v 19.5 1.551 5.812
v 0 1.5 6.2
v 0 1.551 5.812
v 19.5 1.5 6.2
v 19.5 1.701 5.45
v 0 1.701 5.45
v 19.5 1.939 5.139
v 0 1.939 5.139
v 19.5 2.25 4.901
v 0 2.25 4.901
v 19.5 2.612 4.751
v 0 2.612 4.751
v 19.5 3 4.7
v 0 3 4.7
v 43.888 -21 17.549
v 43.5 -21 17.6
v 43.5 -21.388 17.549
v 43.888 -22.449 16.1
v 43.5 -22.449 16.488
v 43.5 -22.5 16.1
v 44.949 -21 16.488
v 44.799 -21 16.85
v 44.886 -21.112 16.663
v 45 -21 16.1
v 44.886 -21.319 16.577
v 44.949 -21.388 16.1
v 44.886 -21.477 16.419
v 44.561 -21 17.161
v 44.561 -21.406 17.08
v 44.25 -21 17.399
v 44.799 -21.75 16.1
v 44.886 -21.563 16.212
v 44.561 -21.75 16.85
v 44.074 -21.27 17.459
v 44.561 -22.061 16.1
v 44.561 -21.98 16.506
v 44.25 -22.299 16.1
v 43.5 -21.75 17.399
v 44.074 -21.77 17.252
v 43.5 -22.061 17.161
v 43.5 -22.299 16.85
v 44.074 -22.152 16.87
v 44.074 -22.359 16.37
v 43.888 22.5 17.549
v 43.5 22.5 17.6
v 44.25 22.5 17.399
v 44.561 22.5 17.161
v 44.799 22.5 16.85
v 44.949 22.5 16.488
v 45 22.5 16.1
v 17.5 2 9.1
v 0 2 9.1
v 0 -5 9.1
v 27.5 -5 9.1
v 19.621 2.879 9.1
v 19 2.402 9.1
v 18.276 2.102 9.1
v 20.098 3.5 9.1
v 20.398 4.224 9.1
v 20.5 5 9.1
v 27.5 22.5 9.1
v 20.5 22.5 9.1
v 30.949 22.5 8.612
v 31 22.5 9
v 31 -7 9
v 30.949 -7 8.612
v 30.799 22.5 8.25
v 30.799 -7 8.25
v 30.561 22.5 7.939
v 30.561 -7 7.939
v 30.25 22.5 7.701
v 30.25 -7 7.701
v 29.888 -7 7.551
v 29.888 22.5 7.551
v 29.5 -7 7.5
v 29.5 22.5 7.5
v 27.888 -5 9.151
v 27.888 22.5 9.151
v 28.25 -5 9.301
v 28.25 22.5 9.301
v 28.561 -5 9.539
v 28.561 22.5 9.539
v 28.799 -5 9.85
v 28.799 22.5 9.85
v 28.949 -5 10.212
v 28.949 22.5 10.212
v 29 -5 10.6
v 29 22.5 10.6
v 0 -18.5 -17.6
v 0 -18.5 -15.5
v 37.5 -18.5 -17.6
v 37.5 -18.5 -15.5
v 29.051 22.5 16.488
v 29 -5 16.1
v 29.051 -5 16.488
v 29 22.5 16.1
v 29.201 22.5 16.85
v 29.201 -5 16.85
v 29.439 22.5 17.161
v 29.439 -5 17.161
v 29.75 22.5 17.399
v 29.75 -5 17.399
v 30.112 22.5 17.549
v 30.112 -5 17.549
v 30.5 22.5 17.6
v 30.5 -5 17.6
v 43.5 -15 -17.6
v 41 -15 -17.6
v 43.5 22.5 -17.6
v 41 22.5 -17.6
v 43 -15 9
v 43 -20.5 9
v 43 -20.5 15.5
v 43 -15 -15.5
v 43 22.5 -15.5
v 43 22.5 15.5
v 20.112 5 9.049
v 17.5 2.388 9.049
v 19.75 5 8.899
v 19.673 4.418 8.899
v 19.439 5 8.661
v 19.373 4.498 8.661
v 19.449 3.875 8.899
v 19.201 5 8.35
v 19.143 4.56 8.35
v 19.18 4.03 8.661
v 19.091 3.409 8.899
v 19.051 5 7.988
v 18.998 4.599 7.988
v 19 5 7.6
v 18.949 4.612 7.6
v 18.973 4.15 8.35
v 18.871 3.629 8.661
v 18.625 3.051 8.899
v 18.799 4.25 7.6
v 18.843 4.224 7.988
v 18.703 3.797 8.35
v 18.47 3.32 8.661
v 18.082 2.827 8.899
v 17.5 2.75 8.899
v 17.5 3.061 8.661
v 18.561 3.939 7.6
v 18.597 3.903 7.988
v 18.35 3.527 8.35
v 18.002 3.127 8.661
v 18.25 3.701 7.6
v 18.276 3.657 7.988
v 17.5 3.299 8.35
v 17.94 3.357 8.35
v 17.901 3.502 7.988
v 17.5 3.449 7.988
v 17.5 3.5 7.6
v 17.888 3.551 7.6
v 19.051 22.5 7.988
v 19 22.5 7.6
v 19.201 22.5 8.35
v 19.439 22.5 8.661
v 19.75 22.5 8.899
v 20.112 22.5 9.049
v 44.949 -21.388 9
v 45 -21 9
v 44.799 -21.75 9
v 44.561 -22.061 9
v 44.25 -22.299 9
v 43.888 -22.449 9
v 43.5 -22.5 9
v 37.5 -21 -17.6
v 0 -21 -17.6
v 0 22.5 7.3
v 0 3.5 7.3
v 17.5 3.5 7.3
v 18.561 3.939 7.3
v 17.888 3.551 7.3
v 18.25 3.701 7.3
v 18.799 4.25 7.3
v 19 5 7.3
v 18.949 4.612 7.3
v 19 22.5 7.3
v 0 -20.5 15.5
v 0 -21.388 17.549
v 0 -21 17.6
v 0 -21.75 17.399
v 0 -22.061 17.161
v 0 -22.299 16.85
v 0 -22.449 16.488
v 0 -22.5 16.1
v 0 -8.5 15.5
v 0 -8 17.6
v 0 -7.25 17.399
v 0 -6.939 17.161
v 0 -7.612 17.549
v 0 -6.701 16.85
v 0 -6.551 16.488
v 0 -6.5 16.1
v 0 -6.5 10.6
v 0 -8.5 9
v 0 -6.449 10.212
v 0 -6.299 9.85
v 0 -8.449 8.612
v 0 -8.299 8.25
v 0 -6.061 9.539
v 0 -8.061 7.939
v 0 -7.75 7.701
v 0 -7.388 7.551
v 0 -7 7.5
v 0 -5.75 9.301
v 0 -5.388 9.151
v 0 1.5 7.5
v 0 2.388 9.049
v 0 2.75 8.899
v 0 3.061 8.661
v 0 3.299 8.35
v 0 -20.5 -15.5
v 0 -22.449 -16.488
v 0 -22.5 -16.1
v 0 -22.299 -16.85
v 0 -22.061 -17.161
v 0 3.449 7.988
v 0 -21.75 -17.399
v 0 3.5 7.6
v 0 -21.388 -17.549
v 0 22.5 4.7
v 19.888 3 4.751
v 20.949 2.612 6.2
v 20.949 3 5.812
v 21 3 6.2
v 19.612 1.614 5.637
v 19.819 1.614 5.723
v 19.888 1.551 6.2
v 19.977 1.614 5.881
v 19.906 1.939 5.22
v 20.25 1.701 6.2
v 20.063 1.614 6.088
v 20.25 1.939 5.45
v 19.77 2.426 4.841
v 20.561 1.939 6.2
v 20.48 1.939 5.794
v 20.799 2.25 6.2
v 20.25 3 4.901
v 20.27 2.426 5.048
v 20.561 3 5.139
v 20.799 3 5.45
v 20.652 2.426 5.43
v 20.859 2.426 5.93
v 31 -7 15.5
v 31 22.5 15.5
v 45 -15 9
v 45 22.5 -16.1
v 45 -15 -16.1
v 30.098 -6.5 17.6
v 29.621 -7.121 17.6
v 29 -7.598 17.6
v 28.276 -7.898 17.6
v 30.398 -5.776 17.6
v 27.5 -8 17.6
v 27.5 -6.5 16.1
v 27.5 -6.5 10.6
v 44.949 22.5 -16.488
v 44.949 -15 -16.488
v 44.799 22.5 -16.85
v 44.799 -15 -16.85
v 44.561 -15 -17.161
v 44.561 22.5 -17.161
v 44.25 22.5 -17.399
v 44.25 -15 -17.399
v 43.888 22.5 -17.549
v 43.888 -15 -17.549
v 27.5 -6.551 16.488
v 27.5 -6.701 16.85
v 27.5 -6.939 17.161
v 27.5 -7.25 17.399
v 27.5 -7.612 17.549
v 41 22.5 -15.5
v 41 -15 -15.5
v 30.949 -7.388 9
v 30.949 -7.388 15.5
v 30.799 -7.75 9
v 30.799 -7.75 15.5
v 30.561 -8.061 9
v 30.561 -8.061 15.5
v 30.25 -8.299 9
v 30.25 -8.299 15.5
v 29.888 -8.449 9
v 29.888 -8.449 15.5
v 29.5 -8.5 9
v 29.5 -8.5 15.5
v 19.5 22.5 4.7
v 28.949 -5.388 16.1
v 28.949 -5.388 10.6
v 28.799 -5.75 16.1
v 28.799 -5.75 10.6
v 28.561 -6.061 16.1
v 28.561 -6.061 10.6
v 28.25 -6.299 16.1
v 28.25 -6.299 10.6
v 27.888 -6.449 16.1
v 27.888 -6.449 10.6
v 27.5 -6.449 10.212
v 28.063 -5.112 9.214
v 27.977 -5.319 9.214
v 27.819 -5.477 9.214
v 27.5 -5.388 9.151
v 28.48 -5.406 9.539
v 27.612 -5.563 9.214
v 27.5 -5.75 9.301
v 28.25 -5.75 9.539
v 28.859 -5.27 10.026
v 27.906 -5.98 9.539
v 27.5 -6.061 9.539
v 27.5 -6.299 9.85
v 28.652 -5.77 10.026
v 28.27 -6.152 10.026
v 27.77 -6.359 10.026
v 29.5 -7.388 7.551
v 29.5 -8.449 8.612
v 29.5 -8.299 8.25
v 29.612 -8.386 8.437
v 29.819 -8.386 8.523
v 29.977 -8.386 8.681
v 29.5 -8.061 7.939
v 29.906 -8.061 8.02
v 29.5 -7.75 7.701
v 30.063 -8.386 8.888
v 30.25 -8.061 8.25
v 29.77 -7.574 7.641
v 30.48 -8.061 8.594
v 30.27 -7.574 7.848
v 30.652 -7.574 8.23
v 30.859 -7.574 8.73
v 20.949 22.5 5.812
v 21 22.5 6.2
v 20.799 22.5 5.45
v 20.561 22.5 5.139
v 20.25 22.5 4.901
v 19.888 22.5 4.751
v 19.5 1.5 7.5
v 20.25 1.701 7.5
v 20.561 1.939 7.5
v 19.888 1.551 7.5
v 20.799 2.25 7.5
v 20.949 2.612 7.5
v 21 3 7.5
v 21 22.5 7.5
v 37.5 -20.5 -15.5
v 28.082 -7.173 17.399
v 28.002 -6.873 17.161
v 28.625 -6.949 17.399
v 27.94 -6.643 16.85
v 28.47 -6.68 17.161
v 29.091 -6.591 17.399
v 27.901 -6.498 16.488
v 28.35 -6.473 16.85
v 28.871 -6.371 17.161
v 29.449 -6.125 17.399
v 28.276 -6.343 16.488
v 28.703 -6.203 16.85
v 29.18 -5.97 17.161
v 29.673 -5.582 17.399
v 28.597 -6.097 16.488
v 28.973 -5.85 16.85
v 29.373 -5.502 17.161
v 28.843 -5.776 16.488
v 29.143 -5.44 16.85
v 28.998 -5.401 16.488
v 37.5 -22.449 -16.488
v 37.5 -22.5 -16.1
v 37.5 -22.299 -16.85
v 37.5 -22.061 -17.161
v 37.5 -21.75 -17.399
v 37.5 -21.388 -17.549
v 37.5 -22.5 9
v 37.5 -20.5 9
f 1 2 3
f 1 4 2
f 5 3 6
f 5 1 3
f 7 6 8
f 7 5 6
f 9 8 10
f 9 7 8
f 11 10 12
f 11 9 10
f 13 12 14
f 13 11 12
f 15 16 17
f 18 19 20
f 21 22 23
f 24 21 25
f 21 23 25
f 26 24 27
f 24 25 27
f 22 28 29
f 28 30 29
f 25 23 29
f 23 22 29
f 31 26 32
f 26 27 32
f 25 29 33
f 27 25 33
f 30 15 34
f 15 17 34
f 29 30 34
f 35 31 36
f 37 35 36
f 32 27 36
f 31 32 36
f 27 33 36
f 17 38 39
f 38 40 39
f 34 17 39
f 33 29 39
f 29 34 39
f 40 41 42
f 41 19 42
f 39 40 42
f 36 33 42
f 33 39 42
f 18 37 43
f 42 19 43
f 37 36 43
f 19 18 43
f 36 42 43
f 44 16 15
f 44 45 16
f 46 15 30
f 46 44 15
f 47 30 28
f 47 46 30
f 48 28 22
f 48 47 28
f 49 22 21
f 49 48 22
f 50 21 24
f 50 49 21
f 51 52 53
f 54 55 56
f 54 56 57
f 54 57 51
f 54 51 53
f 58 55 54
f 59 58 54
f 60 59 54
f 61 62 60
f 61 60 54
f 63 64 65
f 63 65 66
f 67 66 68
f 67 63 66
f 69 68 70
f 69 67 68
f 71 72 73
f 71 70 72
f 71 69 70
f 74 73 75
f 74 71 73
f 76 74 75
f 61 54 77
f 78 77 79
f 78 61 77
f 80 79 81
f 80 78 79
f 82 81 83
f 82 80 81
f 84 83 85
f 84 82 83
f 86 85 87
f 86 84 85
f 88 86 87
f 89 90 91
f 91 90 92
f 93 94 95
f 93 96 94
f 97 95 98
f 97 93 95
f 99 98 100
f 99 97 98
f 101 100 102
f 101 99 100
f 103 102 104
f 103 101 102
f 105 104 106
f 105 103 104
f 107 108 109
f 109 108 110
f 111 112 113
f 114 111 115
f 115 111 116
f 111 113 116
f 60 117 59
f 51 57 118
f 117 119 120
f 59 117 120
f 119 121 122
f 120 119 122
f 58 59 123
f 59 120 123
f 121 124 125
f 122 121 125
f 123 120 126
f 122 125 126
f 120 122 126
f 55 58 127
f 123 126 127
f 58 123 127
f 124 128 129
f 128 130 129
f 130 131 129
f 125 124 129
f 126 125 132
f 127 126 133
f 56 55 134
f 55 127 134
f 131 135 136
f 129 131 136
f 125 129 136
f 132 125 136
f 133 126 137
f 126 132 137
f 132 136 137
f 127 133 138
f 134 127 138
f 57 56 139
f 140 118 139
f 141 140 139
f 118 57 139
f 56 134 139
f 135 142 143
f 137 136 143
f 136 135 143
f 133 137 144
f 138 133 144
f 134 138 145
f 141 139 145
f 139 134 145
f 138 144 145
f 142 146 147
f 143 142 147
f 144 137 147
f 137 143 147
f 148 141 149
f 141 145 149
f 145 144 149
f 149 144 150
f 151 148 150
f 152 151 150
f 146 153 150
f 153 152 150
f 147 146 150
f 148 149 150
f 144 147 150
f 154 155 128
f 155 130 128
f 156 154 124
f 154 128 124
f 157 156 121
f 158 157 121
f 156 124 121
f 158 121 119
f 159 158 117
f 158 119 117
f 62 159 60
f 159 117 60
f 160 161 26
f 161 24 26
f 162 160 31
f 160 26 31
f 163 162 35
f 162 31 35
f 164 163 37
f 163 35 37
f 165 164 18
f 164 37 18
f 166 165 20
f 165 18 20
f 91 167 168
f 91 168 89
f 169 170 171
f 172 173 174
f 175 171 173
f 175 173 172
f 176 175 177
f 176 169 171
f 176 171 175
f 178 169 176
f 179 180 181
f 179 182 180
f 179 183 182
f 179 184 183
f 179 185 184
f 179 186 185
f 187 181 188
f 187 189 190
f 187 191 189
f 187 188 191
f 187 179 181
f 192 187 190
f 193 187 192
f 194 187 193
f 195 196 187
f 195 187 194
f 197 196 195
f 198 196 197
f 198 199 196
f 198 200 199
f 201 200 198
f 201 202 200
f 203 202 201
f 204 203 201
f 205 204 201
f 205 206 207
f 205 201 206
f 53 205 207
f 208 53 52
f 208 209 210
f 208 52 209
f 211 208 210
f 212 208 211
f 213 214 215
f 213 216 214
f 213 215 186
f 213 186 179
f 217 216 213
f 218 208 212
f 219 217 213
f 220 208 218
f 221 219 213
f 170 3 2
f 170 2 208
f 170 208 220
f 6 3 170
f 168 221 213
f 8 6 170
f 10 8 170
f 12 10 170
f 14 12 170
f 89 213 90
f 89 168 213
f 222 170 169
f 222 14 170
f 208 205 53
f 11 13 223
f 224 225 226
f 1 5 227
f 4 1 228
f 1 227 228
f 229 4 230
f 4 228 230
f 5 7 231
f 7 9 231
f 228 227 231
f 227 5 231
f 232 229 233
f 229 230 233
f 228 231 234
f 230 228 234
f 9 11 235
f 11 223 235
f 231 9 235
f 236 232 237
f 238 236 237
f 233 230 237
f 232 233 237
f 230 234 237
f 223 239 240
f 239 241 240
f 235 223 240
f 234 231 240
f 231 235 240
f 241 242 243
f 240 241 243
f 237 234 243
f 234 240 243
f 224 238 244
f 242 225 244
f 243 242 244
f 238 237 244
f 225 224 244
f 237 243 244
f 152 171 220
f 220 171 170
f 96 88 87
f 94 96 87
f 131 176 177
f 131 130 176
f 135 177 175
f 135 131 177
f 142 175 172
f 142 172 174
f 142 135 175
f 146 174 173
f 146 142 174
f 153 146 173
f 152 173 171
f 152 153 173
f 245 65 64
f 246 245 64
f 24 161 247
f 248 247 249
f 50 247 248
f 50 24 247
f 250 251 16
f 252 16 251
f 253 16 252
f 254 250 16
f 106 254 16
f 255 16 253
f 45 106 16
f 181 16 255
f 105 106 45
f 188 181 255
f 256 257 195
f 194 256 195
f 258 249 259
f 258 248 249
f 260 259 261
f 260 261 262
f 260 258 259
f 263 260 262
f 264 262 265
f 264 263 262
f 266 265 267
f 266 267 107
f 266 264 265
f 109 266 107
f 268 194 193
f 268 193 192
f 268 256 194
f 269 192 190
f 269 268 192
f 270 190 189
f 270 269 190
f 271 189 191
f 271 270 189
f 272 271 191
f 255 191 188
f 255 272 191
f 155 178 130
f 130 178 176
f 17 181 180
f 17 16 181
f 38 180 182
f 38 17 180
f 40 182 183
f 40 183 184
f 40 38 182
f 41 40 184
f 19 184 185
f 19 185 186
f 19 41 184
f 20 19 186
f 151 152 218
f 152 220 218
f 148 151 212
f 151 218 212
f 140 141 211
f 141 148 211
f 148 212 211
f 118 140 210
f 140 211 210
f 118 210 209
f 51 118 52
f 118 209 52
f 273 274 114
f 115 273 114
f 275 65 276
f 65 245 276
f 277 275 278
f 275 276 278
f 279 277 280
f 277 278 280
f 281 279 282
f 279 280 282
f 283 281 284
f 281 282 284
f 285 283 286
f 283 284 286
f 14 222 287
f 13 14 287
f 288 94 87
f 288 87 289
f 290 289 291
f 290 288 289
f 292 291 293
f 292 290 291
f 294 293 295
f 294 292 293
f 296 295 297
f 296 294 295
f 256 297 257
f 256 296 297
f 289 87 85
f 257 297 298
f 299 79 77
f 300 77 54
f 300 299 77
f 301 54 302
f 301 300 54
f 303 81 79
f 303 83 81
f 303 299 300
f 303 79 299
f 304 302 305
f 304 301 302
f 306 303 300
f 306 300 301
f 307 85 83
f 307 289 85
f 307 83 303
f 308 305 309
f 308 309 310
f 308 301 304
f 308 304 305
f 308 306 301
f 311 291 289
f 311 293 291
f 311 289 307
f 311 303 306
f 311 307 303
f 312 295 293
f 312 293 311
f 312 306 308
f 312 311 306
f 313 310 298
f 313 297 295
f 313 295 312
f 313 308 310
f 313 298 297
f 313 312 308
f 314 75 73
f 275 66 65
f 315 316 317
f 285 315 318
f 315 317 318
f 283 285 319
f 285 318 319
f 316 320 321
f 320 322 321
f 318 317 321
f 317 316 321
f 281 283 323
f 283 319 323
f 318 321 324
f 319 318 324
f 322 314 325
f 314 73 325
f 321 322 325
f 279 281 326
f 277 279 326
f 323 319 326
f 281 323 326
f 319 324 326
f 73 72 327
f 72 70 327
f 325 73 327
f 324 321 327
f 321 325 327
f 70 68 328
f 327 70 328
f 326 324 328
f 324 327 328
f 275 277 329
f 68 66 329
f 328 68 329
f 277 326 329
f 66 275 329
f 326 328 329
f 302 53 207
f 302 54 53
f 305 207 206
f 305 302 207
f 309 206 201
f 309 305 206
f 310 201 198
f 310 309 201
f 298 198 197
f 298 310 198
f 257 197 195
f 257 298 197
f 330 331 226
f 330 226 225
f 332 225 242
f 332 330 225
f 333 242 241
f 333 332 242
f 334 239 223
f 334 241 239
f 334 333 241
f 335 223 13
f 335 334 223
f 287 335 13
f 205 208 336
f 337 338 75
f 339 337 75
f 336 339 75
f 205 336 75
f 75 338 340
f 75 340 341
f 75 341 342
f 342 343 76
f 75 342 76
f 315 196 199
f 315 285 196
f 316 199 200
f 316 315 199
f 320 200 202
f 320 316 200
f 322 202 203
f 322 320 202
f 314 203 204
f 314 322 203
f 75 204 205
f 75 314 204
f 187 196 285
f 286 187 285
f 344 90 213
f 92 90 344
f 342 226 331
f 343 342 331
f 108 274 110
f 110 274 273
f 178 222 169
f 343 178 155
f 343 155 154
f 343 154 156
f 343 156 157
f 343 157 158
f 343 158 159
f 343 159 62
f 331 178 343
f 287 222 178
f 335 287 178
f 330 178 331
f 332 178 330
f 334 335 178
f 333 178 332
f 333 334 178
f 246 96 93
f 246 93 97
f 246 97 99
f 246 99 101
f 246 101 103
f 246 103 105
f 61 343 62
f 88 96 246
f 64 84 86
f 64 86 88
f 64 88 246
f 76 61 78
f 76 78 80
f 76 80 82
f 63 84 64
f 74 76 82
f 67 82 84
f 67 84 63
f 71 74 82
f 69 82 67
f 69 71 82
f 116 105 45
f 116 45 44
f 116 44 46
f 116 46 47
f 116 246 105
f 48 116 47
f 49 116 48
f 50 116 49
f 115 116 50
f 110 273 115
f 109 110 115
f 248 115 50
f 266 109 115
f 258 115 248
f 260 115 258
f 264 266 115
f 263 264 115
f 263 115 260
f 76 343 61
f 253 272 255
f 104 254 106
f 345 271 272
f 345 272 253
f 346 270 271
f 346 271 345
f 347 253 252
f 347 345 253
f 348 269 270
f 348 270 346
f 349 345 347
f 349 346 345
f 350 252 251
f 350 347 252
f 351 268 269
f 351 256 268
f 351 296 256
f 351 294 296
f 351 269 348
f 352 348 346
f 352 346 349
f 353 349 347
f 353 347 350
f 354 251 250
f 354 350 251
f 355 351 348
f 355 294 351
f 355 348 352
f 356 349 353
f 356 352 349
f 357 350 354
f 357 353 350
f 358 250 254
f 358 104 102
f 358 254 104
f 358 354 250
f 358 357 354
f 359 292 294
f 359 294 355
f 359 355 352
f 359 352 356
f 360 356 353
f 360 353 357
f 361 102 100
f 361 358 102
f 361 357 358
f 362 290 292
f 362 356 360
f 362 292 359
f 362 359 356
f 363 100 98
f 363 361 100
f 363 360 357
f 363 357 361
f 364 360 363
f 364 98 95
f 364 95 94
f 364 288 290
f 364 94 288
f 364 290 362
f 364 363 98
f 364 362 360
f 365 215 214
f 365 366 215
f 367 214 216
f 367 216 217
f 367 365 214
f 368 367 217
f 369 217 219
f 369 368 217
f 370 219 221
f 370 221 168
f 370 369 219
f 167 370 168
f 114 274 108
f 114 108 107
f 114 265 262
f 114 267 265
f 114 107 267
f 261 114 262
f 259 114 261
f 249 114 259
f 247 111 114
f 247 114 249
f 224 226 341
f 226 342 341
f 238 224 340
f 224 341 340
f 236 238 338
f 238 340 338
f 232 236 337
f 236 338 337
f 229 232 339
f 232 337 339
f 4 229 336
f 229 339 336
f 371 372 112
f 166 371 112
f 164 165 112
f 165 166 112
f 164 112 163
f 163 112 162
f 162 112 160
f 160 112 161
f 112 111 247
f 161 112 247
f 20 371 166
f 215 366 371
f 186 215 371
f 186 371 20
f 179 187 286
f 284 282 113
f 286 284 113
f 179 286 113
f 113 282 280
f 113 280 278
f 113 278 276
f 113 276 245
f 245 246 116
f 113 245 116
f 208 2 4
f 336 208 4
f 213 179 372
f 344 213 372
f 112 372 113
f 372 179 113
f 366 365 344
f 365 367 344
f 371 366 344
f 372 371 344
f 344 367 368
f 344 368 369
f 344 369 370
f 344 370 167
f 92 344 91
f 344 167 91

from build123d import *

# Parameters (mm, degrees)
F0_W          = 45
F0_H          = 35.2
F1_DEPTH      = 45
F2_W          = 29
F2_H          = 29
F3_DEPTH      = 22.5
F4_W          = 47
F4_H          = 47
F5_DEPTH      = 15.5
F6_W          = 47
F6_H          = 47
F7_DEPTH      = 28
F8_W          = 15
F8_H          = 15
F9_DEPTH      = 24.7
F9_DEPTH_BACK = 9
F11_START     = 7.5
F11_DEPTH     = 8
F13_START     = 7.5
F13_DEPTH     = 1.6
F15_START     = 4.7
F15_DEPTH     = 2.8
F17_START     = 4.7
F16_W         = 19
F16_H         = 19
F17_DEPTH     = 2.6
F18_R         = 1.5


with BuildPart() as f1:
    # F0 (on Right) → F1 (new body)
    with BuildSketch(Plane.YZ):
        Rectangle(F0_W, F0_H)
    extrude(amount=F1_DEPTH)

    # F2 (on Top) → F3 (cut, symmetric)
    with BuildSketch(Plane.XY):
        with Locations((14.5, 8)):
            Rectangle(F2_W, F2_H)
    extrude(amount=F3_DEPTH, both=True, mode=Mode.SUBTRACT)

    # F4 (on Top) → F5 (cut, symmetric)
    with BuildSketch(Plane.XY):
        with Locations((19.5, 3)):
            Rectangle(F4_W, F4_H)
    extrude(amount=F5_DEPTH, both=True, mode=Mode.SUBTRACT)

    # F6 (on Top) → F7 (cut)
    with BuildSketch(Plane.XY):
        with Locations((17.5, 5)):
            Rectangle(F6_W, F6_H)
    extrude(amount=-F7_DEPTH, mode=Mode.SUBTRACT)

    # F8 (on Top) → F9 (cut, two sides)
    with BuildSketch(Plane.XY) as f9_sk:
        with Locations((45, -22.5)):
            Rectangle(F8_W, F8_H)
    extrude(amount=-F9_DEPTH, mode=Mode.SUBTRACT)
    extrude(f9_sk.sketch, amount=F9_DEPTH_BACK, mode=Mode.SUBTRACT)

    # F10 (on Top) → F11 (join)
    with BuildSketch(Plane.XY.offset(F11_START)):
        Polygon((31, 22.5), (29, 22.5), (29, -6.5), (0, -6.5), (0, -8.5), (31, -8.5), align=None)
    extrude(amount=F11_DEPTH)

    # F12 (on Top) → F13 (join)
    with BuildSketch(Plane.XY.offset(F13_START)):
        Polygon((29, -6.5), (29, 22.5), (19, 22.5), (19, 3.5), (0, 3.5), (0, -6.5), align=None)
    extrude(amount=F13_DEPTH)

    # F14 (on Top) → F15 (join)
    with BuildSketch(Plane.XY.offset(F15_START)):
        Polygon((21, 22.5), (19, 22.5), (19, 3.5), (0, 3.5), (0, 1.5), (21, 1.5), align=None)
    extrude(amount=F15_DEPTH)

    # F16 (on Top) → F17 (join)
    with BuildSketch(Plane.XY.offset(F17_START)):
        with Locations((9.5, 13)):
            Rectangle(F16_W, F16_H)
    extrude(amount=F17_DEPTH)

    # F18
    f18_edges = [f1.edges().sort_by_distance(p)[0] for p in [
        (22.5, -22.5, 17.6),
        (45, 0, 17.6),
        (45, 3.75, -17.6),
        (18.75, -22.5, -17.6),
        (14.5, -6.5, 17.6),
        (29, 8, 17.6),
        (29, -6.5, 13.35),
        (45, -22.5, 13.3),
        (29, 8, 9.1),
        (14.5, -6.5, 9.1),
        (19, 13, 9.1),
        (9.5, 3.5, 9.1),
        (19, 3.5, 8.2),
        (31, 7, 7.5),
        (21, 12, 4.7),
        (10.5, 1.5, 4.7),
        (15.5, -8.5, 7.5),
        (21, 1.5, 6.1),
        (31, -8.5, 11.5),
    ]]
    fillet(f18_edges, radius=F18_R)


solid = f1.part
